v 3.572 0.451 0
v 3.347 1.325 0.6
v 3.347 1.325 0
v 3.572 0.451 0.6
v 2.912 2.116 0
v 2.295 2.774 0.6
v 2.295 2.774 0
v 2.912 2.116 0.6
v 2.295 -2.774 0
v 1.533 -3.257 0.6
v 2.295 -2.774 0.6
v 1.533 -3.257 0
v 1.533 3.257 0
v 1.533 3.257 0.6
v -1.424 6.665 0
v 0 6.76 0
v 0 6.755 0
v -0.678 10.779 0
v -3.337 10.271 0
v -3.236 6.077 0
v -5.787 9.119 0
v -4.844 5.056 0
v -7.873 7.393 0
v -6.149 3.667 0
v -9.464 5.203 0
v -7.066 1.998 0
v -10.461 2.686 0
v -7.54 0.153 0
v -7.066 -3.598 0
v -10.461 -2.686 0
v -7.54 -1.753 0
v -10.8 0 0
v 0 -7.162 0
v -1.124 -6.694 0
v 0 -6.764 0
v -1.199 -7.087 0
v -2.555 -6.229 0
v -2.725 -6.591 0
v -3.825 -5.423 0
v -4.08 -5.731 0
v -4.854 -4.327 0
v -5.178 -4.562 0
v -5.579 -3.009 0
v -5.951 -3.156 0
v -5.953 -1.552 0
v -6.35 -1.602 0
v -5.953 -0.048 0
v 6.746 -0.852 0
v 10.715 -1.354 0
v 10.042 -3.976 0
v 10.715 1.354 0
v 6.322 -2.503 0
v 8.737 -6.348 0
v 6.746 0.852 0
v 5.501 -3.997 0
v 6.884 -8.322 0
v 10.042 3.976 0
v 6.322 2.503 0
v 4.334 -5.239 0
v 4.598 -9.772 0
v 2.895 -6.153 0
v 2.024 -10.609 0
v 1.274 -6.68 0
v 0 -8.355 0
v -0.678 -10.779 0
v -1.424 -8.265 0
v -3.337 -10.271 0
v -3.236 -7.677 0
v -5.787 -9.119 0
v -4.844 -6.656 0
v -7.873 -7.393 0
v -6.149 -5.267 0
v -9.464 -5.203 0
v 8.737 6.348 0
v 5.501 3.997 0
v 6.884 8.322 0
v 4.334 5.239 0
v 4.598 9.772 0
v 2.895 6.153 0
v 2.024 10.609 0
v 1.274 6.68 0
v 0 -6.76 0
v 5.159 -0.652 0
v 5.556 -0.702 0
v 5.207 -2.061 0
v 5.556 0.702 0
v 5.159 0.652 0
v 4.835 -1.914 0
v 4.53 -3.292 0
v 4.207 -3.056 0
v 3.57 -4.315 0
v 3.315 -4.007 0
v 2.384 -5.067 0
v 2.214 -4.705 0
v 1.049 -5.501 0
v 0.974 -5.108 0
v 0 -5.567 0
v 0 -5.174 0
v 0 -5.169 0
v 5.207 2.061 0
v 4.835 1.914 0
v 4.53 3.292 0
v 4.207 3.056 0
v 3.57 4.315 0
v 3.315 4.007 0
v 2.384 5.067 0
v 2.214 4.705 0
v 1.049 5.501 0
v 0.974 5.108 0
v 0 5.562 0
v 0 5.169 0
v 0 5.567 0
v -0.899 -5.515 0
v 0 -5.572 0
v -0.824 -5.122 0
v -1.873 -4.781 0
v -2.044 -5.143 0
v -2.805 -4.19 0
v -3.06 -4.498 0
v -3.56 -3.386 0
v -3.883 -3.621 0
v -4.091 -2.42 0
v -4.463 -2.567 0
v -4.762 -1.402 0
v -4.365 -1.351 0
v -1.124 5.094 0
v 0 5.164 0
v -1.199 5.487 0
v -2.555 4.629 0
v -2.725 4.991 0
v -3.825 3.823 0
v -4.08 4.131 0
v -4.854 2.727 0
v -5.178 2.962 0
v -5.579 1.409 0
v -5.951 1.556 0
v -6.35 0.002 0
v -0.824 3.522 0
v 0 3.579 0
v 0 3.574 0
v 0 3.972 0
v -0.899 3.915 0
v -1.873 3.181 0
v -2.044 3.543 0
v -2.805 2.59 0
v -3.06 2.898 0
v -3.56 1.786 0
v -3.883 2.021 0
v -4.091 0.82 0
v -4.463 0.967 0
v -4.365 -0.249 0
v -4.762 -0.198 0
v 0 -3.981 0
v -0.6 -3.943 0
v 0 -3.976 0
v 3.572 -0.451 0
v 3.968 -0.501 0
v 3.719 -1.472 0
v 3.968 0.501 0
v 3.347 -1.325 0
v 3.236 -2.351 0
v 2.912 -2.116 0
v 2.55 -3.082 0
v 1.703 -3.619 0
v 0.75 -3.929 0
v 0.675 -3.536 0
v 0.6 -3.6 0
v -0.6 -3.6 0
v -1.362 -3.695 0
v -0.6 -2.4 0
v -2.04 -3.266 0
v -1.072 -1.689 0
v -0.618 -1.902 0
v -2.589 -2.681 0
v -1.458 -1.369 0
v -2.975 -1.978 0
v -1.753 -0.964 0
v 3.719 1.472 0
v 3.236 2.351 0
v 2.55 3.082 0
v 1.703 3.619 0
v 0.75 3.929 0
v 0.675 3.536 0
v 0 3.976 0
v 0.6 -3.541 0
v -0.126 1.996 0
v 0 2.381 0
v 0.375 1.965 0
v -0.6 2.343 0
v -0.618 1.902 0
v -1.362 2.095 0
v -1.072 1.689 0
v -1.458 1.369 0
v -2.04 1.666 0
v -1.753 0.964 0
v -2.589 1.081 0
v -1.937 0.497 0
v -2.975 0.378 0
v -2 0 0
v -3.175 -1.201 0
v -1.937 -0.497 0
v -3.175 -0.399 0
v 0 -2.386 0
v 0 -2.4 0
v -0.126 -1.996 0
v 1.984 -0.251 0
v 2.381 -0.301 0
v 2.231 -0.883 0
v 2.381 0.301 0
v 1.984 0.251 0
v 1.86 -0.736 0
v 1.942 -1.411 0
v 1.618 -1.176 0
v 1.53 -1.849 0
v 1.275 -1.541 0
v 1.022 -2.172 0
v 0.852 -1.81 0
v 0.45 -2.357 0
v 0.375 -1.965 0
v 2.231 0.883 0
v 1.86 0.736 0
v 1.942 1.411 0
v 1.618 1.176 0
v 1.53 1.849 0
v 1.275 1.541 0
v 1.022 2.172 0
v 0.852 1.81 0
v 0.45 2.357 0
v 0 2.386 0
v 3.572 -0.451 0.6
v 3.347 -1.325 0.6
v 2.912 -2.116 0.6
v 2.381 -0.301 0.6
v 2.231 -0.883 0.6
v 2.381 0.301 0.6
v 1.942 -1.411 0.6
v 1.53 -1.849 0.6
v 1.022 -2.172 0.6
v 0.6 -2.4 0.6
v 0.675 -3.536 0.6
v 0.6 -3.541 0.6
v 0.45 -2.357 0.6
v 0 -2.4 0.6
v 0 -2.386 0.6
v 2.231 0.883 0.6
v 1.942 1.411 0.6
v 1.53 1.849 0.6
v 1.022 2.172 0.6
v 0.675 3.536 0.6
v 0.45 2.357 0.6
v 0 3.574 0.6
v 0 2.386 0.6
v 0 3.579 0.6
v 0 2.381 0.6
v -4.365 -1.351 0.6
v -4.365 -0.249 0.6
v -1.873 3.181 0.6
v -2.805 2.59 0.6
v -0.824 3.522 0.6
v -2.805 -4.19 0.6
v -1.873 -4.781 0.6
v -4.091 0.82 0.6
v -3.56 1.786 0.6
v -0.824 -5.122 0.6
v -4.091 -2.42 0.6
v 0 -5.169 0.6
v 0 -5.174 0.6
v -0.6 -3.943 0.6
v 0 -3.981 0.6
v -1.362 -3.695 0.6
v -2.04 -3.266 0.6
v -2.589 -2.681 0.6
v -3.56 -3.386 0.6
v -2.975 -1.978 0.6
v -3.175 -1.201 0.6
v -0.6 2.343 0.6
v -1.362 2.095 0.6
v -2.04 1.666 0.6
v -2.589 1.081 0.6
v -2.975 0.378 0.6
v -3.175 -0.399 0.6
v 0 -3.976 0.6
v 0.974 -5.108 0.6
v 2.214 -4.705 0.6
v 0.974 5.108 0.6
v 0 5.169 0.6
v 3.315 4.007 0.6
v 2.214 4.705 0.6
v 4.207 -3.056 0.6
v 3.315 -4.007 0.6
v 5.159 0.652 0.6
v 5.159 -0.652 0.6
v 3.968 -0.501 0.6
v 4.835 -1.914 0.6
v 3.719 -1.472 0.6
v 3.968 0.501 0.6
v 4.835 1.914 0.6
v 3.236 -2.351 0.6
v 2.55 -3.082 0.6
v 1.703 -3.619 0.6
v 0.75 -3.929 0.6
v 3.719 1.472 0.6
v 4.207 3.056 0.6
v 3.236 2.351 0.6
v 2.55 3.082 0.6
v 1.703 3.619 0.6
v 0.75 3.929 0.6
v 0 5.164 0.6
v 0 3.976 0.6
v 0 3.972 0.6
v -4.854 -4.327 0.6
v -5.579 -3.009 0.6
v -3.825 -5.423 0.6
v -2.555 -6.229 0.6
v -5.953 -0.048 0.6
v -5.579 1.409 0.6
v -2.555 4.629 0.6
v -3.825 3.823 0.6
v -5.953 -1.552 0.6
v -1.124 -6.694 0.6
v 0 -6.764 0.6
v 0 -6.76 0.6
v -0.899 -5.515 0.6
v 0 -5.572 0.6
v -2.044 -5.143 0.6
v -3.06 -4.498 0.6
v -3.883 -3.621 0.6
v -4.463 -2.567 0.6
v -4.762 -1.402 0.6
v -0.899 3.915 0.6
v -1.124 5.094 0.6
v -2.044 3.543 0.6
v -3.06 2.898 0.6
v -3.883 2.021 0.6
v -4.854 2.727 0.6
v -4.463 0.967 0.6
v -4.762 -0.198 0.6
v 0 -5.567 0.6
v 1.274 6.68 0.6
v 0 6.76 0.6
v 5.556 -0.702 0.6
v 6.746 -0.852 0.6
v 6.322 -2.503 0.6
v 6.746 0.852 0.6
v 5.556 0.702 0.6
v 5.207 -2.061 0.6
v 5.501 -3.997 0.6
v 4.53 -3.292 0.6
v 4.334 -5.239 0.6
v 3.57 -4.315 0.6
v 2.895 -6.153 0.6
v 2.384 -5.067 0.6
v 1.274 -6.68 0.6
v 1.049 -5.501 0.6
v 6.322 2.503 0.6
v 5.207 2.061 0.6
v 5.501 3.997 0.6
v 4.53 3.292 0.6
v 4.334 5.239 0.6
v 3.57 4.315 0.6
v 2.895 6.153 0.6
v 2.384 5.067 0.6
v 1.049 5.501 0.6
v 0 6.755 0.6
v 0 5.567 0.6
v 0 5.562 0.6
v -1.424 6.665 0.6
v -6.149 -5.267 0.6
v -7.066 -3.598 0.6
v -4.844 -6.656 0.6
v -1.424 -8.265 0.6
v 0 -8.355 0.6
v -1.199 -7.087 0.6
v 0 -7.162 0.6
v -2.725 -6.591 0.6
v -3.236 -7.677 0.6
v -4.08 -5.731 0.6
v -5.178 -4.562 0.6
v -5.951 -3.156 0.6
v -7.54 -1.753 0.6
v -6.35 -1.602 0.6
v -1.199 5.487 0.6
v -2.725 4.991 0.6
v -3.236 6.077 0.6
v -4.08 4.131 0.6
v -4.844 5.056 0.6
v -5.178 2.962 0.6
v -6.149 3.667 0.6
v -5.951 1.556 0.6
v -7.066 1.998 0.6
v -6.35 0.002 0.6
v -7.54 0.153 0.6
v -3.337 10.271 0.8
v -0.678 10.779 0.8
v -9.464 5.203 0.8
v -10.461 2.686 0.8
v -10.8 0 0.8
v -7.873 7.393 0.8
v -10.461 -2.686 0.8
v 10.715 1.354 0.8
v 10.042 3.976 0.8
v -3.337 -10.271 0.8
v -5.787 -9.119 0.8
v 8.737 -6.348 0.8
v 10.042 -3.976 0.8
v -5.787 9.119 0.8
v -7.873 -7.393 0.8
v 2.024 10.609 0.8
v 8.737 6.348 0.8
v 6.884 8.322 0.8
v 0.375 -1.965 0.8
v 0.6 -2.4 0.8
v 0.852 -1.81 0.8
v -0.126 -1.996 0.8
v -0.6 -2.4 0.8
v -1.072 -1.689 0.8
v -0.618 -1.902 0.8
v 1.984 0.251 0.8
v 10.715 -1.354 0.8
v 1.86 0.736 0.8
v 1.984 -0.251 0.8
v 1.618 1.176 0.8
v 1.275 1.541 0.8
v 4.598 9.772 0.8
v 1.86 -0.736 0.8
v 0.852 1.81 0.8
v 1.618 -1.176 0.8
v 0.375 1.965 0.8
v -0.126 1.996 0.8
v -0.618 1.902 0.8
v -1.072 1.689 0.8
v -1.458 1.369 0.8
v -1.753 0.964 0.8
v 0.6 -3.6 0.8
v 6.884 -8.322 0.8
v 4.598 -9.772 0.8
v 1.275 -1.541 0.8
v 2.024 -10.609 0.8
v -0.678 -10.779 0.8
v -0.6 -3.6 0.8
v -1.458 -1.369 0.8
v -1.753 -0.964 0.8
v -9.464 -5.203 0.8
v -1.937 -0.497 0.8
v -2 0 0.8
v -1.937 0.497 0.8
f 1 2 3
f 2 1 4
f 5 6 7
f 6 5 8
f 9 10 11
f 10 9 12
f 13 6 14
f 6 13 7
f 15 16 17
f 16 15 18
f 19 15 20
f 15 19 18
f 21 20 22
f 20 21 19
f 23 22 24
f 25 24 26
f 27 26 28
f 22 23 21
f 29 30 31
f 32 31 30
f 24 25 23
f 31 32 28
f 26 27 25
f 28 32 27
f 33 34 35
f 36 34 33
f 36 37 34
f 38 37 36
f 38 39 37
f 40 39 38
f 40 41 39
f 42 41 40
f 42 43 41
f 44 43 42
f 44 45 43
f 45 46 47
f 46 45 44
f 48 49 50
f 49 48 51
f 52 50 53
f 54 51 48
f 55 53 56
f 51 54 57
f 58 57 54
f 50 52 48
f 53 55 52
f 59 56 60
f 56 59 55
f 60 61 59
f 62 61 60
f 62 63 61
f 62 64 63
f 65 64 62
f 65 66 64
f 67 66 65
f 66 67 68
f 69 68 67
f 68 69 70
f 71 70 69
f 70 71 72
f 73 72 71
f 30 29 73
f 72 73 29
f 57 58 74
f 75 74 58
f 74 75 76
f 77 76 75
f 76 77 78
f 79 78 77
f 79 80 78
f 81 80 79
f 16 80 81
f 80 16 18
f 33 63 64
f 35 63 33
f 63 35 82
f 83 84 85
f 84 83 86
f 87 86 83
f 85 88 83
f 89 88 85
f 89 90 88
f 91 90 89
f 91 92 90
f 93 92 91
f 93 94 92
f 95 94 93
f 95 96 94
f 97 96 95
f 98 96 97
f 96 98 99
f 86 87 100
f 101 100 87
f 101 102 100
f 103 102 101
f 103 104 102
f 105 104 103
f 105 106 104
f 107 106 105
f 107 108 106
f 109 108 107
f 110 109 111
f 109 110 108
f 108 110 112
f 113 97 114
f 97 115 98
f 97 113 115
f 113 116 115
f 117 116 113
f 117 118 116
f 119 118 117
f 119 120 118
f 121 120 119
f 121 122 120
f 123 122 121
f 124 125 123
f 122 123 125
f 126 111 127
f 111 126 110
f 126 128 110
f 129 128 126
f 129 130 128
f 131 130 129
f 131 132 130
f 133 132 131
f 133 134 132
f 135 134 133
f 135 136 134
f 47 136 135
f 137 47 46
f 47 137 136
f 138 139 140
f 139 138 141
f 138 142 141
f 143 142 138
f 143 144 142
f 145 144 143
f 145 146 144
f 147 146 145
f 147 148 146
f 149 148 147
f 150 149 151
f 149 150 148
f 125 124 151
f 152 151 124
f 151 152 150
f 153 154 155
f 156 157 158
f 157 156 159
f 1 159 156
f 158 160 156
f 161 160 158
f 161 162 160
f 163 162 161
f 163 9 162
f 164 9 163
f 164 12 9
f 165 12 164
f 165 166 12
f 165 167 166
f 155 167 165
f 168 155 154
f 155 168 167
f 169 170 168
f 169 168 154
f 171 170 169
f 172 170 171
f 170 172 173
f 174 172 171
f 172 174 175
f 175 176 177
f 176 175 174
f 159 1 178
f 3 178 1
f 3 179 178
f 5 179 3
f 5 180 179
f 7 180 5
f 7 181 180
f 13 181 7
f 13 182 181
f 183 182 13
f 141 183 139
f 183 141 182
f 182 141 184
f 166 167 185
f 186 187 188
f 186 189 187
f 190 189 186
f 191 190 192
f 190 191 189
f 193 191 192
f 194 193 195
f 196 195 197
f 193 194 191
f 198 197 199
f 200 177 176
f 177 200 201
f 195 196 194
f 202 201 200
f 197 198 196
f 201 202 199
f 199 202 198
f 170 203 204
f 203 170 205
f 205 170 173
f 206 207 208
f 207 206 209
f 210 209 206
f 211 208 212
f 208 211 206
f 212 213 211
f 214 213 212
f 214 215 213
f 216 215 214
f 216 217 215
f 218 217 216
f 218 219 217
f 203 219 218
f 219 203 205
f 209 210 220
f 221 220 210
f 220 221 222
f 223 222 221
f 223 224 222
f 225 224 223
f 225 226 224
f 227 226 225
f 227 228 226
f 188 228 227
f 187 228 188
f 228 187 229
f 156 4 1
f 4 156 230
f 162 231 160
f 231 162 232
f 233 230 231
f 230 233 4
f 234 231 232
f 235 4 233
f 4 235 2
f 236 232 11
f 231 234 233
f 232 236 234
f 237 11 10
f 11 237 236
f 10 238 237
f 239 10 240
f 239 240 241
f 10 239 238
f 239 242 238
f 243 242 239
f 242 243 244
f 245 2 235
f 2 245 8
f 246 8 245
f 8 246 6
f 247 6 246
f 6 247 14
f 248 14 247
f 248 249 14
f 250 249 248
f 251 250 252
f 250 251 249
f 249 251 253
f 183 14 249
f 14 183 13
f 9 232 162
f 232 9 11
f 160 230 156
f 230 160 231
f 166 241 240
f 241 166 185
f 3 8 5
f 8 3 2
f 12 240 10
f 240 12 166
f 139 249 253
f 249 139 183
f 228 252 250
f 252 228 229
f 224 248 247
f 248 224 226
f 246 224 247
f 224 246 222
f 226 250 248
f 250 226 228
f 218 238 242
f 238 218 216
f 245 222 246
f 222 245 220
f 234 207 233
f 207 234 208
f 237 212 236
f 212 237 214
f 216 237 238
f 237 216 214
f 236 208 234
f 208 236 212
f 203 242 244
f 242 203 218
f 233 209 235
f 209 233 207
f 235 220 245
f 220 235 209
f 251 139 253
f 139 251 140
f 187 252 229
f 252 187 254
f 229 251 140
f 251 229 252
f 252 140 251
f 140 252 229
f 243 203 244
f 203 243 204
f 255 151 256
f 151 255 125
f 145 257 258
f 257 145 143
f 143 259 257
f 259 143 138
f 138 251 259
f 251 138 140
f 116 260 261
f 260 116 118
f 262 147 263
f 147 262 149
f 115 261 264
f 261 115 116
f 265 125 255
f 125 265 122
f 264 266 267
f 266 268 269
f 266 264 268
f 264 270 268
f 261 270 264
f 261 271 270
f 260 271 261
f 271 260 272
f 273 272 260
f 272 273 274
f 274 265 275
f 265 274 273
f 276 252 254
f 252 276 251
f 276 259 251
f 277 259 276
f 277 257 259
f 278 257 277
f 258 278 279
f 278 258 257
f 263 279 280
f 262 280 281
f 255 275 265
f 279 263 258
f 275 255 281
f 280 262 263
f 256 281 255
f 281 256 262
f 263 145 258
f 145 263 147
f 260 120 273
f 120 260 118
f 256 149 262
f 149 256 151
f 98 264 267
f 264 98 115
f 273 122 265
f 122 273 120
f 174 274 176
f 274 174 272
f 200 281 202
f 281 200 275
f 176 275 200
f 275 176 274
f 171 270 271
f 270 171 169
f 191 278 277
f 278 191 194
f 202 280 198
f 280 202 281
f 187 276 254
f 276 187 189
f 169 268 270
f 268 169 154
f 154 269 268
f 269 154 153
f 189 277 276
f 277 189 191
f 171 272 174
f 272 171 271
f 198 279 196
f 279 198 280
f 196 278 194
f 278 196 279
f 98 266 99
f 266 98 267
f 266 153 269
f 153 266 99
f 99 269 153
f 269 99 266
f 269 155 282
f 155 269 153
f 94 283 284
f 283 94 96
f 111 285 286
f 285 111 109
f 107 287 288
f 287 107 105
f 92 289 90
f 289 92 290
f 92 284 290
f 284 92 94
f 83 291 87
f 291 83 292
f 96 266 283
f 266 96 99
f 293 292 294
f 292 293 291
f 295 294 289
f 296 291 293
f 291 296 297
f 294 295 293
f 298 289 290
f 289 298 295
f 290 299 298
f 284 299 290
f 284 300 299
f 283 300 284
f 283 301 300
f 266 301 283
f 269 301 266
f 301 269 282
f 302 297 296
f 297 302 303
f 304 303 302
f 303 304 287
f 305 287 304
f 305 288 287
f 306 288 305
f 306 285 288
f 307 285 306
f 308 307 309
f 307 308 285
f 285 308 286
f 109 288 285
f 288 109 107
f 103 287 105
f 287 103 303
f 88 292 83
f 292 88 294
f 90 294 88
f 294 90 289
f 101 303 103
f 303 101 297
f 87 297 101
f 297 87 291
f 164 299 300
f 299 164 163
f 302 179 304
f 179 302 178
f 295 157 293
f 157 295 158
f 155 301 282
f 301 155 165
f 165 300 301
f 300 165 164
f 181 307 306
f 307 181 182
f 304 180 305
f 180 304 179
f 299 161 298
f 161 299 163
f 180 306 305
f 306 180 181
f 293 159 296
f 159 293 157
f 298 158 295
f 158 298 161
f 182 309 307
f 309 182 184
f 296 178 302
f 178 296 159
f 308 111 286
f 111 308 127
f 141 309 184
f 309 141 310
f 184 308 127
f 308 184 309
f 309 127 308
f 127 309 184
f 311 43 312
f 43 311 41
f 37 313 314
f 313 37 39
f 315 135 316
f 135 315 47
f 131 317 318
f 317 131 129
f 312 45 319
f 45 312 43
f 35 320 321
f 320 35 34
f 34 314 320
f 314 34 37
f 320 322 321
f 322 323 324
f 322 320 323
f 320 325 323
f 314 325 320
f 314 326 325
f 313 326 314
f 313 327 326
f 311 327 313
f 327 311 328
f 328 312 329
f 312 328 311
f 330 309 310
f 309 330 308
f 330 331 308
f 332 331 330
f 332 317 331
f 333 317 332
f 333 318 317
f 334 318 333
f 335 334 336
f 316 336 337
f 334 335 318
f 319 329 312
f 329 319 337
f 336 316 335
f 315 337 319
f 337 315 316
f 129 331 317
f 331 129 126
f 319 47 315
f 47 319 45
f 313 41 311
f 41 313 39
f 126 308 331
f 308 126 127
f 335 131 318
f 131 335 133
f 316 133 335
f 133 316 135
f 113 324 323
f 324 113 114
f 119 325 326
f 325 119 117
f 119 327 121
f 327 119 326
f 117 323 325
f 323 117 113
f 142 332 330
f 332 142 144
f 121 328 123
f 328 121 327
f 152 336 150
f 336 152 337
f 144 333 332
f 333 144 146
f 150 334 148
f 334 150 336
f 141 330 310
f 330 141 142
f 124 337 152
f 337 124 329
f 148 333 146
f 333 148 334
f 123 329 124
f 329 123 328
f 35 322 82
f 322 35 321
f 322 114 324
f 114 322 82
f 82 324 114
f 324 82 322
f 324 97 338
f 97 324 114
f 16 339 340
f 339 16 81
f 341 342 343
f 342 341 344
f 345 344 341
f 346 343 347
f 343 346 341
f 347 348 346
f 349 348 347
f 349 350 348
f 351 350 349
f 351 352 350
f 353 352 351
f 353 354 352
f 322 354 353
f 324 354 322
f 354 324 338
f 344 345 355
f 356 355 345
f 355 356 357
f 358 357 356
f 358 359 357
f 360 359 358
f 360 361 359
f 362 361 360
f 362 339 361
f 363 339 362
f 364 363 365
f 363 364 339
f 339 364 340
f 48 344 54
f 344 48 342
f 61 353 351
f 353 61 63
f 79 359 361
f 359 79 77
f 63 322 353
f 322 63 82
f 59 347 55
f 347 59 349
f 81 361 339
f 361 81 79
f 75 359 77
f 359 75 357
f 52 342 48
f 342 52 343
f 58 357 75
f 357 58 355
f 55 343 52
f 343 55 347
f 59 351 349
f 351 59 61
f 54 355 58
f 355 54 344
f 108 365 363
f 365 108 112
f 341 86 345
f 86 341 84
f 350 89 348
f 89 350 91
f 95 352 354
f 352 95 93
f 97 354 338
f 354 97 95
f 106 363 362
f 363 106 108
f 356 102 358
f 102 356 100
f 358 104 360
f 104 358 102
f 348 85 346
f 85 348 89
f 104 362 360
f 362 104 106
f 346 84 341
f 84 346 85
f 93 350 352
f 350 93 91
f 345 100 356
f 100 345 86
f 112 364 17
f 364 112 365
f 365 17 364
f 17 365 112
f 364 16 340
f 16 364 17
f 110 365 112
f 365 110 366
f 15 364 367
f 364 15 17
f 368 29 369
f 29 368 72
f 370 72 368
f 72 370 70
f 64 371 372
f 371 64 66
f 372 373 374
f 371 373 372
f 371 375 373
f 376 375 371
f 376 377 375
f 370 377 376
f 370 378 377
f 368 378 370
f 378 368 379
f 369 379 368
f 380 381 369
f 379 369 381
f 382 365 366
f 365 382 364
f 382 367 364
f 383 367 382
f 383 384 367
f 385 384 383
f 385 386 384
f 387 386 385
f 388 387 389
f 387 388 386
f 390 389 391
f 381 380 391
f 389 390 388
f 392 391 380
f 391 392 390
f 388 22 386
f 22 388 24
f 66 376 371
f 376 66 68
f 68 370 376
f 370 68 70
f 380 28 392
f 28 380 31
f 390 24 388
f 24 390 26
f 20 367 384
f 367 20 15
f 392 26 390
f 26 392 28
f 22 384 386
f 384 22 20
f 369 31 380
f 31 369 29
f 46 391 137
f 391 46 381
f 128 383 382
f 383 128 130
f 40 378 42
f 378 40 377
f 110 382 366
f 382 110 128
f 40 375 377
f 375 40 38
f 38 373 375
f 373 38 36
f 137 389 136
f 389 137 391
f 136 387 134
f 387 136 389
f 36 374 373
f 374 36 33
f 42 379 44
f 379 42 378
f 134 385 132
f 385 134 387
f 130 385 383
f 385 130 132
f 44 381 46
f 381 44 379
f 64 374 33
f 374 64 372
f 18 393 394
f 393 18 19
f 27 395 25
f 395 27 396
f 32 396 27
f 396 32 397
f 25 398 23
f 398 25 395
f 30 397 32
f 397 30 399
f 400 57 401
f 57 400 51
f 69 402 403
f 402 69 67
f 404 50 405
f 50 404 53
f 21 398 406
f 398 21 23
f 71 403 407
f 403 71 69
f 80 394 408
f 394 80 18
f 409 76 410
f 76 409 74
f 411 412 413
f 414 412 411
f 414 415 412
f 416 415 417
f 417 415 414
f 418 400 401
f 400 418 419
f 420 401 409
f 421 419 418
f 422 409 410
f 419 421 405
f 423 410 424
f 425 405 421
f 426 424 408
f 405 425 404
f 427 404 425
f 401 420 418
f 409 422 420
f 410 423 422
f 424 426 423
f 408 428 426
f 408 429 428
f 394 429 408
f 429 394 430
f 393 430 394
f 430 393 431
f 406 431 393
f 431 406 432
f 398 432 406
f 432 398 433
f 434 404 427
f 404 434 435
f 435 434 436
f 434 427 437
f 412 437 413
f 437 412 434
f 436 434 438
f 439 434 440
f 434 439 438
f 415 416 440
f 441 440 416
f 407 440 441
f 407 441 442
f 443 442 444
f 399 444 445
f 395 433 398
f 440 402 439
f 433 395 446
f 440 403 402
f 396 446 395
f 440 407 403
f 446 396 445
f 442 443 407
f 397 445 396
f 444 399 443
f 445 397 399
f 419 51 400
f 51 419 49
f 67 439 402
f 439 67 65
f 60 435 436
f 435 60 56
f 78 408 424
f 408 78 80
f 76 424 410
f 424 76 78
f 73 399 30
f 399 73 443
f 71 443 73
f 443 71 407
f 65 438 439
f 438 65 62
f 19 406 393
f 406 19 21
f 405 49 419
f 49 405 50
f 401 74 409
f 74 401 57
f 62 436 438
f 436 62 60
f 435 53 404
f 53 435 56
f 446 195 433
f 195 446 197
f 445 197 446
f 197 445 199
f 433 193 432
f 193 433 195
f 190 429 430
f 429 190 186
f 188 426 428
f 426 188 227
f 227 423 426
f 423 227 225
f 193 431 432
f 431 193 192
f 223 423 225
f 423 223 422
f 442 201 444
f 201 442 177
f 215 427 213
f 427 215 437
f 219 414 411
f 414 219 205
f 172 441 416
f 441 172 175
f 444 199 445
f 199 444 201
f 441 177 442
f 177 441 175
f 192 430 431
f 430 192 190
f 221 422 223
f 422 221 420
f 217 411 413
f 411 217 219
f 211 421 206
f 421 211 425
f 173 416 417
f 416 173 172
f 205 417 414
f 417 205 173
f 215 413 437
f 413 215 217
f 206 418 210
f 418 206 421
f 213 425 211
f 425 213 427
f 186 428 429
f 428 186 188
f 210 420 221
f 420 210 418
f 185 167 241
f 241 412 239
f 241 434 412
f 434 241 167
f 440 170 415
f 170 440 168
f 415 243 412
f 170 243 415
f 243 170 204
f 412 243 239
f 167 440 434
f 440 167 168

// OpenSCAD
// 3D Printed Electromagentic Coil Insulator Generator
// Brian Minnick 2024

$fn=25;

// Coil Parameters
num_coil_layers = 1;
num_coil_rings = 3;
inner_diameter = 4;

gen_a_or_b = 0; // 0 or 1

// Printer Parameters
layer_width = 0.4;
layer_height = 0.2;

// Trace Parameters (Number of Layers)
trace_layers_thickness = 3;
trace_layers_depth = 3;

// Insulation Parameters (Number of Layers)
ins_layers_radial = 1;
ins_layers_axial = 1;

// Trace Parameters
trace_width = layer_width*trace_layers_thickness;
trace_depth = layer_height*trace_layers_depth;

// Insulation Parameters
radial_insulation = layer_width*ins_layers_radial;
layer_insulation = layer_height*ins_layers_axial;

// Electrical Parameters
current = 10; //Amps
num_turns = num_coil_layers*num_coil_rings;
mu = 0.0000012566370614359172;


// Calculate Magnetic Force
coil_length = (num_coil_layers*layer_height*2)/1000;
A = 3.141592*(inner_diameter/2000)^2;
F = ((num_turns*current)^2*mu*A)/(2*0.0005^2);

echo(A);
echo(F, "N of force");


// Call Function
generate_coil_stack(
    num_coil_layers,
    num_coil_rings,
    inner_diameter,
    trace_width,
    trace_depth,
    radial_insulation,
    layer_insulation
);

// Generate insulation

//difference() {
//    cylinder(h=num_coil_layers*(trace_depth+layer_insulation), r=inner_diameter/2+(num_coil_rings+1)*(trace_width+radial_insulation)+radial_insulation);
//    
//    generate_coil_stack(
//        num_coil_layers,
//        num_coil_rings,
//        inner_diameter,
//        trace_width,
//        trace_depth,
//        radial_insulation,
//        layer_insulation
//    );
//}


// Generate a whole coil
module generate_coil_stack(
    n_coil_layers,
    n_coil_rings,
    id,
    t_width,
    t_depth,
    i_radial,
    i_axial
){
    union() {
        for (r = [gen_a_or_b : num_coil_layers - 1 + gen_a_or_b]) {
            if (r%2==1){
                difference(){
                    // form the coil layer
                    translate([0,0,r*(t_depth+i_axial)]) generate_coil_layer(n_coil_rings,id,t_width,t_depth,i_radial,i_axial);
                    
                    // form the connection between this layer and the next
                    translate([0,-1*((id/2)+t_width/2+i_radial+n_coil_rings*(t_width+i_radial)),(2*t_depth+i_axial)/2+(r*(t_depth+i_axial))])
                    
                    cube([t_depth*2, t_width, 2*t_depth+i_axial], center=true);
                }
            }
            if (r%2==0){
                difference() {
                    // form the coil layer and mirror it because we are on an odd coil number
                    mirror ([1,0,0]) 
                    translate([0,0,r*(t_depth+i_axial)]) 
                    generate_coil_layer(n_coil_rings,id,t_width,t_depth,i_radial,i_axial);
                    
                    // form the connection between this layer and the next
                    translate([0,-1*((id/2)+t_width/2+i_radial),(2*t_depth+i_axial)/2+(r*(t_depth+i_axial))])
                    
                    cube([t_depth*2, t_width, 2*t_depth+i_axial], center=true);
                }
            }
        }
    }
    // With the coil stack constructed, we want to make the insulation
}

// Generate a single coil layer
module generate_coil_layer(
n_coil_rings,
id,
t_width,
t_depth,
i_radial,
i_axial){
    coil_layer_depth = i_axial+t_depth;
    center_offset = (t_width+i_radial)/2;
    //outer_radius = (id/2)+center_offset+t_width*n_coil_rings+i_axial*(n_coil_rings+1);
    
    outer_radius = (id/2+(n_coil_rings+1)*(t_width+i_radial)+i_radial);
    
    r_inc = t_width+i_radial;
    
    //difference() {
        //cylinder(h=coil_layer_depth, r=(id/2)+(i_radial));
        //cylinder(h=coil_layer_depth, r=(id/2)+(i_radial));
    //}
    difference(){
        cylinder(h=1*(trace_depth+layer_insulation), r=inner_diameter/2+(num_coil_rings+1)*(trace_width+radial_insulation)+radial_insulation+2);
        
        union(){
            for ( i = [0 : 1 : n_coil_rings - 1]){
                gen_half(0, (id/2)+i_radial+(i*r_inc), t_width, t_depth, outer_radius);
                rotate(180) gen_half(center_offset, (id/2)+i_radial+center_offset+(i*r_inc), t_width, t_depth, outer_radius);
            }
        }
        
        cylinder(h=1*(trace_depth+layer_insulation), r=inner_diameter/2);
    }
    
}

module gen_half(
coil_center,
ir,
t_width,
t_depth,
outer_radius,
){
    translate([0,coil_center,0])
    difference(){
        cylinder(h=t_depth, r=ir+t_width);
        translate([0, 0, -0.01]) cylinder(h=t_depth+0.02, r=ir);
        translate([outer_radius,0,0]) cube(outer_radius*2, center = true);
    };
    
}
